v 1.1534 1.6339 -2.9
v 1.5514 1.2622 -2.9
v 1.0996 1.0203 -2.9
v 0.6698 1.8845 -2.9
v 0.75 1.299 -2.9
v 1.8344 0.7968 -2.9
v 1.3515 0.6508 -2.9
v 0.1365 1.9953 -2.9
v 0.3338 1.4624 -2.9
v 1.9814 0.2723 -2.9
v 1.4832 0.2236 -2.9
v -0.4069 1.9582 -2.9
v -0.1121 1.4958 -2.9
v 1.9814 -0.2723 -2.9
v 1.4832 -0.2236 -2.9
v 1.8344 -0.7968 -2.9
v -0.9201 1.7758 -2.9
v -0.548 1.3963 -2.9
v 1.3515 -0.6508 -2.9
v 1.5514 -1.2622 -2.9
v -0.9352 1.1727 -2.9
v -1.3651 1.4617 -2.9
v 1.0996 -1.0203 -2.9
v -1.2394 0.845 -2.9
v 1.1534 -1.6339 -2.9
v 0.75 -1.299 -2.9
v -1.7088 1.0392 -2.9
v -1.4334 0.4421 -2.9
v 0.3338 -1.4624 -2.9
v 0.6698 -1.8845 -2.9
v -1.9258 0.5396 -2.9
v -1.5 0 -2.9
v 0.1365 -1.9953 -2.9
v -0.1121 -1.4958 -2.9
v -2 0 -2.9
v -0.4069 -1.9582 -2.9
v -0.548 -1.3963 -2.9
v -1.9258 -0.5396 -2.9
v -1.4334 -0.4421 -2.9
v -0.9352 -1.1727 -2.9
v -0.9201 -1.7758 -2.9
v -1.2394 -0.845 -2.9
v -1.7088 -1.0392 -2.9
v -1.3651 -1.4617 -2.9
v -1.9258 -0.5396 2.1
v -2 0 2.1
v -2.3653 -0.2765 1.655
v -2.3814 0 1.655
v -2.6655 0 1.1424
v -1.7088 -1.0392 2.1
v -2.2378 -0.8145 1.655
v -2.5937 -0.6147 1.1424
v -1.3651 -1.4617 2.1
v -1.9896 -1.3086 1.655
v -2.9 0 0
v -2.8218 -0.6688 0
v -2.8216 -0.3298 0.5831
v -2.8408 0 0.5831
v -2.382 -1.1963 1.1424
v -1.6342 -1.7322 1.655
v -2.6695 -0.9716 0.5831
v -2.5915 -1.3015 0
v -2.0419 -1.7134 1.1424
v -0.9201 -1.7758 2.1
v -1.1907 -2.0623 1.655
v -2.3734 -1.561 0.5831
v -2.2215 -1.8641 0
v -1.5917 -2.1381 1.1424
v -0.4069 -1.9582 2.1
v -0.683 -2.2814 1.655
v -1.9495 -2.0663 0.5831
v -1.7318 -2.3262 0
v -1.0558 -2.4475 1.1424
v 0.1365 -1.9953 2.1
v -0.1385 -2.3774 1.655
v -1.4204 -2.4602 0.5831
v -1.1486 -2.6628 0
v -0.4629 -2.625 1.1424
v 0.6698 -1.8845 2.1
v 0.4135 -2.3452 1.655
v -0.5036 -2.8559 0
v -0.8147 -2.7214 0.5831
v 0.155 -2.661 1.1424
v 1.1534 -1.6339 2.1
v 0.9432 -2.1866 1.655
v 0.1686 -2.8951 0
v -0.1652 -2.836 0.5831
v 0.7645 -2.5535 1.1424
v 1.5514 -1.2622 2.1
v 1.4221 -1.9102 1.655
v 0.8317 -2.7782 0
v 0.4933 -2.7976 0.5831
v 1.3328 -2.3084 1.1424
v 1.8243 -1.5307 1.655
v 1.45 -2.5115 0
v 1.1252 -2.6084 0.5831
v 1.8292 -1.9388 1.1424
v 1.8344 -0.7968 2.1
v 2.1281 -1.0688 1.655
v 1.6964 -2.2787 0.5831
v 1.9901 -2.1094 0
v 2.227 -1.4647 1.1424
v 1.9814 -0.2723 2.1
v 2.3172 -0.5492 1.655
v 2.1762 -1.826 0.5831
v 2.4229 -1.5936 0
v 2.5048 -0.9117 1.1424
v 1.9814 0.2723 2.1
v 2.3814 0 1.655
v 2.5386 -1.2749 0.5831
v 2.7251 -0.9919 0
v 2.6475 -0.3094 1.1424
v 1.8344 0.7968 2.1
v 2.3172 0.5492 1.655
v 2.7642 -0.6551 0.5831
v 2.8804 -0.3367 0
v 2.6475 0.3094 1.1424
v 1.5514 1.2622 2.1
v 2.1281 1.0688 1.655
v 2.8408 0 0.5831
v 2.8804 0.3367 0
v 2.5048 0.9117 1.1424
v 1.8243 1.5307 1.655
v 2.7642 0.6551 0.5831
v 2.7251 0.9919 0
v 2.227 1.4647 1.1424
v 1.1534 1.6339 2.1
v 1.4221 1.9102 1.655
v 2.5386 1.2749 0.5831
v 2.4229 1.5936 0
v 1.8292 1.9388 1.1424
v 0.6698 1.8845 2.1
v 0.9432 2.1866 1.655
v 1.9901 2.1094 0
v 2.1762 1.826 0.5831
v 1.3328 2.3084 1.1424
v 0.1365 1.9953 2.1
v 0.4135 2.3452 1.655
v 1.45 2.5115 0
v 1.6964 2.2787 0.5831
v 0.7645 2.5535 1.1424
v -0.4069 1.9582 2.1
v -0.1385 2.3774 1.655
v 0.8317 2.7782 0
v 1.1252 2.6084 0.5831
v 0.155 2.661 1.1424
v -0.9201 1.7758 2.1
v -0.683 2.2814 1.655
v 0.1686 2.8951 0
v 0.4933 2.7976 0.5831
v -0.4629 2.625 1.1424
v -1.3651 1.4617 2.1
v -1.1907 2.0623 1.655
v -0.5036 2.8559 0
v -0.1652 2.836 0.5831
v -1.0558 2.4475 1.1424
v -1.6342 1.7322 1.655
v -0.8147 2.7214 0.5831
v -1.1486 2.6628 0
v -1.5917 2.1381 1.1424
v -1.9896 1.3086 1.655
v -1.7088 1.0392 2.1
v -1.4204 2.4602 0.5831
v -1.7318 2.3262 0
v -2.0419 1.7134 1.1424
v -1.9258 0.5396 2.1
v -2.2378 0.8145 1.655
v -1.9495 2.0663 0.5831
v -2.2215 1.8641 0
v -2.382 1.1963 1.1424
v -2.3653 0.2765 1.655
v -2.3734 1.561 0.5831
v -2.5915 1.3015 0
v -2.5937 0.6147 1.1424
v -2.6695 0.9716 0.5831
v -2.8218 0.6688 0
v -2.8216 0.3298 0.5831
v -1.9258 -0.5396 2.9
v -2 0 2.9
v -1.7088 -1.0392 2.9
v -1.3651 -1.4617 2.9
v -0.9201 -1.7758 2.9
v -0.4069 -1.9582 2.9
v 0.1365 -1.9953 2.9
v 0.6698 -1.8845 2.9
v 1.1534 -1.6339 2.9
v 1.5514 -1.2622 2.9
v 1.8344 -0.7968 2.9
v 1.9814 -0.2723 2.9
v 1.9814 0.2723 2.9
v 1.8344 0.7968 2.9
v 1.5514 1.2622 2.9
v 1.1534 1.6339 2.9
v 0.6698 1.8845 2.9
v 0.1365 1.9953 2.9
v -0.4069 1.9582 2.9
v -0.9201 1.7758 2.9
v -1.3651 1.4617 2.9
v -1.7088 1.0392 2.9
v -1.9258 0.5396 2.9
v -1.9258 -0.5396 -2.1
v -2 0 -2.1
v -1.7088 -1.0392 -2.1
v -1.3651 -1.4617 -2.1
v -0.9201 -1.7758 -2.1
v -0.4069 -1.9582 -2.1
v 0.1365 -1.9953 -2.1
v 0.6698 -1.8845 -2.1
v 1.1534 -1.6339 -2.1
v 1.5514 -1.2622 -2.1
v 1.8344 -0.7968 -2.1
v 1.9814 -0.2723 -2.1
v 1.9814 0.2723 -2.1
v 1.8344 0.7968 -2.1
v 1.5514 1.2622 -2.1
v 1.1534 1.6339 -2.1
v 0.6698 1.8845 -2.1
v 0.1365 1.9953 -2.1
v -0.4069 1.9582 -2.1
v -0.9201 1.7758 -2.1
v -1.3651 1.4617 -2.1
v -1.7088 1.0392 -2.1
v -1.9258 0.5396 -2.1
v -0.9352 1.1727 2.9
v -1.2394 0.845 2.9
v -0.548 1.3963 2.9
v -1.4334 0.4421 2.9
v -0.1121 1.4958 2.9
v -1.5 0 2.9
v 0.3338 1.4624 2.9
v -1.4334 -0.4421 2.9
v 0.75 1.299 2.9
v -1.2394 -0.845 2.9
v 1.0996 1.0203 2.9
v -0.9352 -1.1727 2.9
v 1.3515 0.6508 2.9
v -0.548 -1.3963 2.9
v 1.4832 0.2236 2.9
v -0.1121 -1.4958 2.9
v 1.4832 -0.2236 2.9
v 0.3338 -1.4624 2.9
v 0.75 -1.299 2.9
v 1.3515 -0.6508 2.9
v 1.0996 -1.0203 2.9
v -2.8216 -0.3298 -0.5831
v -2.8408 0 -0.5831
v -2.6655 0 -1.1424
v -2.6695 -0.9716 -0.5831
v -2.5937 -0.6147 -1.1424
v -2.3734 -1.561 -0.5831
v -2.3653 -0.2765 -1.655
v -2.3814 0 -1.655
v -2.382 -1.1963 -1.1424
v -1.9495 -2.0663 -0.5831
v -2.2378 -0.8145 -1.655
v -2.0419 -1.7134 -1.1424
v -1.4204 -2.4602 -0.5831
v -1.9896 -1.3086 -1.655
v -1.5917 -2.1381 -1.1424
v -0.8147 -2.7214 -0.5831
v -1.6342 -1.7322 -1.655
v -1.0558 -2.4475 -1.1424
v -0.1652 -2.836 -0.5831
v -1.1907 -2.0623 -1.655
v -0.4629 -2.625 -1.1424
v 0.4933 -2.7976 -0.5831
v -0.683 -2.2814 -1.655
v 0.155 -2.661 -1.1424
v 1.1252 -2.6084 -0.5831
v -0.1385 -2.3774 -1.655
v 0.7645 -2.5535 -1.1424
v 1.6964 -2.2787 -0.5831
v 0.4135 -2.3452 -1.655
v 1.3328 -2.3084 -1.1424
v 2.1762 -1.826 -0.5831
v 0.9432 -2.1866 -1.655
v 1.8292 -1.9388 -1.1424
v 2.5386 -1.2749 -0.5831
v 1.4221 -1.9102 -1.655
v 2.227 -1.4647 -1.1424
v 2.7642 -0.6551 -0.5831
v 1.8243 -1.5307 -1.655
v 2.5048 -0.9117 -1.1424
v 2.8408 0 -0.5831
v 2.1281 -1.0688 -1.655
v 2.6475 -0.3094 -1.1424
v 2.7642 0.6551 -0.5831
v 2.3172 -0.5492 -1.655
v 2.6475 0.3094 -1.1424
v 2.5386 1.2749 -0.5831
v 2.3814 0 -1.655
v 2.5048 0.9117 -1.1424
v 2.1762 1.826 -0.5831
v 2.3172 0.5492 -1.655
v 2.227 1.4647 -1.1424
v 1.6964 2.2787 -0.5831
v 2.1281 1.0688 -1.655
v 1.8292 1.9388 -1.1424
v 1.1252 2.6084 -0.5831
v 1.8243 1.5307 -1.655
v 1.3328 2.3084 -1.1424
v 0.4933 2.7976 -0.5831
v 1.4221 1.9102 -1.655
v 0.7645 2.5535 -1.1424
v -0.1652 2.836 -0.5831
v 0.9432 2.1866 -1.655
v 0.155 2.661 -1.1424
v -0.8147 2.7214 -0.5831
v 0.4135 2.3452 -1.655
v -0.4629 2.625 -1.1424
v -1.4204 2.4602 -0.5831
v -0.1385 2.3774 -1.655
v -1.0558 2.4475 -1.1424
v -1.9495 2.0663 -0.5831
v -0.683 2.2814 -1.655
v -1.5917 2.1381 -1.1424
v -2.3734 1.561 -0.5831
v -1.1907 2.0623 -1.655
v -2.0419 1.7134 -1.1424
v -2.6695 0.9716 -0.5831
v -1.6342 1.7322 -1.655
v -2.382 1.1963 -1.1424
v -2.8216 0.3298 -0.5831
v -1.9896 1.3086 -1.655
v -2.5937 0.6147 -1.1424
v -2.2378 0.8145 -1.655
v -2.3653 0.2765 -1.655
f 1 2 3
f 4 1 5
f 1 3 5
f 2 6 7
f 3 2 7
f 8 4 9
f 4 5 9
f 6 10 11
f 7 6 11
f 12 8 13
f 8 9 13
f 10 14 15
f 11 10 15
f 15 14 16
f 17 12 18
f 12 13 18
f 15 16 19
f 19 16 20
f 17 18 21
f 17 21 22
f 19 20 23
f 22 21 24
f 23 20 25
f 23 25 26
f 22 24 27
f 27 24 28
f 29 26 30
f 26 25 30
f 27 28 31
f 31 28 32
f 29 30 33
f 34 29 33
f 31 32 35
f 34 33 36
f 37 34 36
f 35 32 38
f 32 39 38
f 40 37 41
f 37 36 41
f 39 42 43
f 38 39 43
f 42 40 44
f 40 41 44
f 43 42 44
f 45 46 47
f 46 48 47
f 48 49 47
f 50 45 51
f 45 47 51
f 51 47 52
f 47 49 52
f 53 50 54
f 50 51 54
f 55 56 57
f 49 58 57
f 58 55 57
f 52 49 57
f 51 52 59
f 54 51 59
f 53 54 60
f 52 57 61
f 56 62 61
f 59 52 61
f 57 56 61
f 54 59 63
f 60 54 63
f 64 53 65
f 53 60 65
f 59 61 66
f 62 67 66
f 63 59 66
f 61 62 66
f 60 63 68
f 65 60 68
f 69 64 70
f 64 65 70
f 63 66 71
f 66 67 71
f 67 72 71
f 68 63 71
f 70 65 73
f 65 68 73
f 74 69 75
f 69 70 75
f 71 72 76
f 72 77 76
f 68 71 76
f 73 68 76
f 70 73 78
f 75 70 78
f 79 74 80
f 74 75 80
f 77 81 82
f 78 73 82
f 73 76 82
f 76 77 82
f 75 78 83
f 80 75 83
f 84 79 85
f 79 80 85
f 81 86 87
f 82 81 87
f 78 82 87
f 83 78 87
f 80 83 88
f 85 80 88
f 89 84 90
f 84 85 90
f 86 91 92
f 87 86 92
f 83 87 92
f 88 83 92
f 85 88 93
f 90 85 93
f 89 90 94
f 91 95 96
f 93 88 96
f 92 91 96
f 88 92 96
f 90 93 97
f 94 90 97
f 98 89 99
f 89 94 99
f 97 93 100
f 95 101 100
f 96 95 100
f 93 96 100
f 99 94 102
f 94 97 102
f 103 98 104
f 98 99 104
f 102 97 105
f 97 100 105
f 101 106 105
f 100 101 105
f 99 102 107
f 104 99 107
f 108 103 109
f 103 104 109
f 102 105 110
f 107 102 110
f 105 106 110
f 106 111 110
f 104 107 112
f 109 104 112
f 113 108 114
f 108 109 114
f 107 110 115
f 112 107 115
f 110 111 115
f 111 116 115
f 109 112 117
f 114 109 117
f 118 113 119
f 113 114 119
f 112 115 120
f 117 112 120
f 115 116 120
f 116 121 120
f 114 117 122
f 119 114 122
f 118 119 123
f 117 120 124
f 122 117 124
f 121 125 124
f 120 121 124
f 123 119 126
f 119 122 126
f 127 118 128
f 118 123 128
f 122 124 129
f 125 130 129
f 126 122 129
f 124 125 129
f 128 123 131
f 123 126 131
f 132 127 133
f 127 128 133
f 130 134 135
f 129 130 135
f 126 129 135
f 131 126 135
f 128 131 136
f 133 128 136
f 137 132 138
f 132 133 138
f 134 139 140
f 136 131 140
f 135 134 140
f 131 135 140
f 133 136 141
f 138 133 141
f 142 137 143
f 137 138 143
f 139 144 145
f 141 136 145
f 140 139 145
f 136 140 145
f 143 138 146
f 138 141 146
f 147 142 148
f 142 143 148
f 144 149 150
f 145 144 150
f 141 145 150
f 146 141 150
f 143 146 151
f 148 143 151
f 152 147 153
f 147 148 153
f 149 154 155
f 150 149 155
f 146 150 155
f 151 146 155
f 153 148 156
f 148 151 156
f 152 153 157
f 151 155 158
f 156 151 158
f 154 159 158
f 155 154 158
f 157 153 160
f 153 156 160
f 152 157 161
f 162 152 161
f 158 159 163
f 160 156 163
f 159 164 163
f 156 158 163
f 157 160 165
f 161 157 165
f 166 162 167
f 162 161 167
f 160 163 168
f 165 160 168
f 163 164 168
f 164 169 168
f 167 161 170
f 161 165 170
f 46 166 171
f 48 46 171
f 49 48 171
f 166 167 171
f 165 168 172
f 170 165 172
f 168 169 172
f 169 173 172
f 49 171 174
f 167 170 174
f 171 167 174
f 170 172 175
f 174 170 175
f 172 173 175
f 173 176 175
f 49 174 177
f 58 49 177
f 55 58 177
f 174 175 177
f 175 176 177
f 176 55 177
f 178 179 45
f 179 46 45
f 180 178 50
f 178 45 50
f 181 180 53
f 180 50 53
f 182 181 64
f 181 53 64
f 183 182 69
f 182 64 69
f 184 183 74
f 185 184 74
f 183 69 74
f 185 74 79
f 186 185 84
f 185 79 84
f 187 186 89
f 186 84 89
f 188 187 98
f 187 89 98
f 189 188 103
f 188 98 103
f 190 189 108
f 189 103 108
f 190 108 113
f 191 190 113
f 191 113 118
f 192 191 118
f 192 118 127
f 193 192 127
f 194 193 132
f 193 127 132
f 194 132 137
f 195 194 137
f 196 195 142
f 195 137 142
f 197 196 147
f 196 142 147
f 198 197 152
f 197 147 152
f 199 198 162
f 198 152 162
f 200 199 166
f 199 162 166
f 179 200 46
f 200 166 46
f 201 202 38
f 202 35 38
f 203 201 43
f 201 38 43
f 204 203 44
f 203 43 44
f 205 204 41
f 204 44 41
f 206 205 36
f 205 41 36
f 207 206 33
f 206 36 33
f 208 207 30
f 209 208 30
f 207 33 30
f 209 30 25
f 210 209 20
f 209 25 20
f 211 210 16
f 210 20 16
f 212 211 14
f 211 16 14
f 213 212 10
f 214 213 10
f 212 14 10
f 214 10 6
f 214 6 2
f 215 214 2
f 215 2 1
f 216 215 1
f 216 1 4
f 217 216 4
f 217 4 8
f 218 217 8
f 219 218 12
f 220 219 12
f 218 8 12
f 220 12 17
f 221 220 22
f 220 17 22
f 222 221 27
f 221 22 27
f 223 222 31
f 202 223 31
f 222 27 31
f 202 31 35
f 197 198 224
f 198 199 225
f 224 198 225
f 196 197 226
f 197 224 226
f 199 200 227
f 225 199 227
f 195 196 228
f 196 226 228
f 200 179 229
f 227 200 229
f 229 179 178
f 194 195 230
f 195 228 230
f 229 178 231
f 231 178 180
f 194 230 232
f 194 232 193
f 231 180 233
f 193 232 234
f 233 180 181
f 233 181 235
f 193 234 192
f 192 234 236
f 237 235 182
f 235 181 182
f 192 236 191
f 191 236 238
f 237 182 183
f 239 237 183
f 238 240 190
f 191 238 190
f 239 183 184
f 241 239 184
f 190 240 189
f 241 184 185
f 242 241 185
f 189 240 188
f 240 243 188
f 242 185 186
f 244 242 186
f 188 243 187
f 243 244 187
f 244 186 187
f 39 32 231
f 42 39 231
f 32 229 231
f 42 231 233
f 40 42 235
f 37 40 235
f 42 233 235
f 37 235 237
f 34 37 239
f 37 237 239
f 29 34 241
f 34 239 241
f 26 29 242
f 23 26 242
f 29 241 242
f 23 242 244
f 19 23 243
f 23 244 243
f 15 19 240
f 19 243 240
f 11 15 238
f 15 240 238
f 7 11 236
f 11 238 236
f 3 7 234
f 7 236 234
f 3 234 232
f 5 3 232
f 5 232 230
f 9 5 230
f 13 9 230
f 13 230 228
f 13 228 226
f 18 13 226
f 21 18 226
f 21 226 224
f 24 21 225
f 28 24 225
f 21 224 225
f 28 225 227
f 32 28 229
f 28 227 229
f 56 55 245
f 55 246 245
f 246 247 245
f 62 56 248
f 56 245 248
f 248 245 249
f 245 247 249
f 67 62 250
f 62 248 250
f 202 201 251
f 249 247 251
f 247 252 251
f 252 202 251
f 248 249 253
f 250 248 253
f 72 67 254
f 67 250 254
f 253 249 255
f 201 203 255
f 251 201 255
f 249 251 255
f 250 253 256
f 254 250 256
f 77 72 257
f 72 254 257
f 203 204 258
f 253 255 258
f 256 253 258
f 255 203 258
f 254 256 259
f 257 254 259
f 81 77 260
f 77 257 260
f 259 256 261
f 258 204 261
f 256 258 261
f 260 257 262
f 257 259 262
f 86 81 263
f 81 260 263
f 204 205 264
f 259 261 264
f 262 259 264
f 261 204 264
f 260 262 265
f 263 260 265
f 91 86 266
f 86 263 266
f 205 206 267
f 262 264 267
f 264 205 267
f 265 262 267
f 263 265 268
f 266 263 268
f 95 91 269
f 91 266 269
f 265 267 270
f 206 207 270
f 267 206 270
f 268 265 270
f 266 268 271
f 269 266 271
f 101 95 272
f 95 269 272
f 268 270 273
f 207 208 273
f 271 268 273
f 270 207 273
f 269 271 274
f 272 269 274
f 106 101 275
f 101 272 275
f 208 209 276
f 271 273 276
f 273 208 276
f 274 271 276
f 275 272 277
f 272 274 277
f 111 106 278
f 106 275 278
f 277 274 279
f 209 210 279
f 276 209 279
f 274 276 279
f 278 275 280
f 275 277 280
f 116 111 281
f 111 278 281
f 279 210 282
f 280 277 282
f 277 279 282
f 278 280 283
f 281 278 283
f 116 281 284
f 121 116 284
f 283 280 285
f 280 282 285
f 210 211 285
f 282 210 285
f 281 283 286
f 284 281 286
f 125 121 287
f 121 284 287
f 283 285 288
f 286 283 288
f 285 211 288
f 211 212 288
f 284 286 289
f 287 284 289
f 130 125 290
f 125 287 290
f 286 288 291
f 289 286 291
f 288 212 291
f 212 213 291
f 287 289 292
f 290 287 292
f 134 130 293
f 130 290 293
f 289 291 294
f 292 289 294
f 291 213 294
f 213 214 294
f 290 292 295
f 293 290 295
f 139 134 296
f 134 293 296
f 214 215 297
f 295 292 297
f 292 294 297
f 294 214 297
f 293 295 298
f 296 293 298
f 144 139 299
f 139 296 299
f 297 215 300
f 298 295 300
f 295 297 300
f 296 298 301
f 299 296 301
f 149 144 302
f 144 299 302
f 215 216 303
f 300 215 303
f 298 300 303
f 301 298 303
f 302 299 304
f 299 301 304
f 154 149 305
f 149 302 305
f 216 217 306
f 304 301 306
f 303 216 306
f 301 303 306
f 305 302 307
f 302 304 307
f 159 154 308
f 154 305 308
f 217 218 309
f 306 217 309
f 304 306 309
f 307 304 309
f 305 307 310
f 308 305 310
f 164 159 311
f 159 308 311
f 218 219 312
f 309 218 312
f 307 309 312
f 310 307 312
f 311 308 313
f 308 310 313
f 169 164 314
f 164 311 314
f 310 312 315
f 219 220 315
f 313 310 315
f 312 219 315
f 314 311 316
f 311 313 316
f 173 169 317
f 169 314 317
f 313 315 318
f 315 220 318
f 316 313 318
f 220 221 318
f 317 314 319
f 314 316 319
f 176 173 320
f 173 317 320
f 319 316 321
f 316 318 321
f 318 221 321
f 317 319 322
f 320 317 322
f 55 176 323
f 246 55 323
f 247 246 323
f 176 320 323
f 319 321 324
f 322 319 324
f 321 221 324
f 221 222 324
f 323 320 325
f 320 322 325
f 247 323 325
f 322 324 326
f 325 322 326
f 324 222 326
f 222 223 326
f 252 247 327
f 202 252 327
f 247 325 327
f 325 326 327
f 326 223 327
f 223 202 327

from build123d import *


with BuildPart() as part:
    # Эскиз1 → Повернуть1 (revolve)
    with BuildSketch(Plane(origin=(0, 0, 0), x_dir=(1, 0, 0), z_dir=(0, 1, 0)), mode=Mode.PRIVATE) as revolve_1_sk:
        with BuildLine():
            Line((2, 2.9), (1.5, 2.9))
            Line((1.5, 2.9), (1.5, 2.481934729))
            ThreePointArc((1.5, 2.481934729), (1.760388745, 2.304567522), (2, 2.1))
            Line((2, 2.1), (2, 2.9))
        make_face()
        with BuildLine():
            ThreePointArc((2, 2.1), (1.760388745, 2.304567522), (1.5, 2.481934729))
            Line((1.5, 2.481934729), (1.5, -2.481934729))
            ThreePointArc((1.5, -2.481934729), (1.760388745, -2.304567522), (2, -2.1))
            Line((2, -2.1), (2, 2.1))
        make_face()
        with BuildLine():
            ThreePointArc((2, -2.1), (1.760388745, -2.304567522), (1.5, -2.481934729))
            Line((1.5, -2.481934729), (1.5, -2.9))
            Line((1.5, -2.9), (2, -2.9))
            Line((2, -2.9), (2, -2.1))
        make_face()
        with BuildLine():
            ThreePointArc((2.9, 0), (2.665520587, 1.142365966), (2, 2.1))
            Line((2, 2.1), (2, -2.1))
            ThreePointArc((2, -2.1), (2.665520587, -1.142365966), (2.9, 0))
        make_face()
    revolve(revolve_1_sk.sketch.rotate(Axis((0, 0, -3.556975885), (0, 0, 1)), 180), axis=Axis((0, 0, -3.556975885), (0, 0, 1)))


solid = part.part
